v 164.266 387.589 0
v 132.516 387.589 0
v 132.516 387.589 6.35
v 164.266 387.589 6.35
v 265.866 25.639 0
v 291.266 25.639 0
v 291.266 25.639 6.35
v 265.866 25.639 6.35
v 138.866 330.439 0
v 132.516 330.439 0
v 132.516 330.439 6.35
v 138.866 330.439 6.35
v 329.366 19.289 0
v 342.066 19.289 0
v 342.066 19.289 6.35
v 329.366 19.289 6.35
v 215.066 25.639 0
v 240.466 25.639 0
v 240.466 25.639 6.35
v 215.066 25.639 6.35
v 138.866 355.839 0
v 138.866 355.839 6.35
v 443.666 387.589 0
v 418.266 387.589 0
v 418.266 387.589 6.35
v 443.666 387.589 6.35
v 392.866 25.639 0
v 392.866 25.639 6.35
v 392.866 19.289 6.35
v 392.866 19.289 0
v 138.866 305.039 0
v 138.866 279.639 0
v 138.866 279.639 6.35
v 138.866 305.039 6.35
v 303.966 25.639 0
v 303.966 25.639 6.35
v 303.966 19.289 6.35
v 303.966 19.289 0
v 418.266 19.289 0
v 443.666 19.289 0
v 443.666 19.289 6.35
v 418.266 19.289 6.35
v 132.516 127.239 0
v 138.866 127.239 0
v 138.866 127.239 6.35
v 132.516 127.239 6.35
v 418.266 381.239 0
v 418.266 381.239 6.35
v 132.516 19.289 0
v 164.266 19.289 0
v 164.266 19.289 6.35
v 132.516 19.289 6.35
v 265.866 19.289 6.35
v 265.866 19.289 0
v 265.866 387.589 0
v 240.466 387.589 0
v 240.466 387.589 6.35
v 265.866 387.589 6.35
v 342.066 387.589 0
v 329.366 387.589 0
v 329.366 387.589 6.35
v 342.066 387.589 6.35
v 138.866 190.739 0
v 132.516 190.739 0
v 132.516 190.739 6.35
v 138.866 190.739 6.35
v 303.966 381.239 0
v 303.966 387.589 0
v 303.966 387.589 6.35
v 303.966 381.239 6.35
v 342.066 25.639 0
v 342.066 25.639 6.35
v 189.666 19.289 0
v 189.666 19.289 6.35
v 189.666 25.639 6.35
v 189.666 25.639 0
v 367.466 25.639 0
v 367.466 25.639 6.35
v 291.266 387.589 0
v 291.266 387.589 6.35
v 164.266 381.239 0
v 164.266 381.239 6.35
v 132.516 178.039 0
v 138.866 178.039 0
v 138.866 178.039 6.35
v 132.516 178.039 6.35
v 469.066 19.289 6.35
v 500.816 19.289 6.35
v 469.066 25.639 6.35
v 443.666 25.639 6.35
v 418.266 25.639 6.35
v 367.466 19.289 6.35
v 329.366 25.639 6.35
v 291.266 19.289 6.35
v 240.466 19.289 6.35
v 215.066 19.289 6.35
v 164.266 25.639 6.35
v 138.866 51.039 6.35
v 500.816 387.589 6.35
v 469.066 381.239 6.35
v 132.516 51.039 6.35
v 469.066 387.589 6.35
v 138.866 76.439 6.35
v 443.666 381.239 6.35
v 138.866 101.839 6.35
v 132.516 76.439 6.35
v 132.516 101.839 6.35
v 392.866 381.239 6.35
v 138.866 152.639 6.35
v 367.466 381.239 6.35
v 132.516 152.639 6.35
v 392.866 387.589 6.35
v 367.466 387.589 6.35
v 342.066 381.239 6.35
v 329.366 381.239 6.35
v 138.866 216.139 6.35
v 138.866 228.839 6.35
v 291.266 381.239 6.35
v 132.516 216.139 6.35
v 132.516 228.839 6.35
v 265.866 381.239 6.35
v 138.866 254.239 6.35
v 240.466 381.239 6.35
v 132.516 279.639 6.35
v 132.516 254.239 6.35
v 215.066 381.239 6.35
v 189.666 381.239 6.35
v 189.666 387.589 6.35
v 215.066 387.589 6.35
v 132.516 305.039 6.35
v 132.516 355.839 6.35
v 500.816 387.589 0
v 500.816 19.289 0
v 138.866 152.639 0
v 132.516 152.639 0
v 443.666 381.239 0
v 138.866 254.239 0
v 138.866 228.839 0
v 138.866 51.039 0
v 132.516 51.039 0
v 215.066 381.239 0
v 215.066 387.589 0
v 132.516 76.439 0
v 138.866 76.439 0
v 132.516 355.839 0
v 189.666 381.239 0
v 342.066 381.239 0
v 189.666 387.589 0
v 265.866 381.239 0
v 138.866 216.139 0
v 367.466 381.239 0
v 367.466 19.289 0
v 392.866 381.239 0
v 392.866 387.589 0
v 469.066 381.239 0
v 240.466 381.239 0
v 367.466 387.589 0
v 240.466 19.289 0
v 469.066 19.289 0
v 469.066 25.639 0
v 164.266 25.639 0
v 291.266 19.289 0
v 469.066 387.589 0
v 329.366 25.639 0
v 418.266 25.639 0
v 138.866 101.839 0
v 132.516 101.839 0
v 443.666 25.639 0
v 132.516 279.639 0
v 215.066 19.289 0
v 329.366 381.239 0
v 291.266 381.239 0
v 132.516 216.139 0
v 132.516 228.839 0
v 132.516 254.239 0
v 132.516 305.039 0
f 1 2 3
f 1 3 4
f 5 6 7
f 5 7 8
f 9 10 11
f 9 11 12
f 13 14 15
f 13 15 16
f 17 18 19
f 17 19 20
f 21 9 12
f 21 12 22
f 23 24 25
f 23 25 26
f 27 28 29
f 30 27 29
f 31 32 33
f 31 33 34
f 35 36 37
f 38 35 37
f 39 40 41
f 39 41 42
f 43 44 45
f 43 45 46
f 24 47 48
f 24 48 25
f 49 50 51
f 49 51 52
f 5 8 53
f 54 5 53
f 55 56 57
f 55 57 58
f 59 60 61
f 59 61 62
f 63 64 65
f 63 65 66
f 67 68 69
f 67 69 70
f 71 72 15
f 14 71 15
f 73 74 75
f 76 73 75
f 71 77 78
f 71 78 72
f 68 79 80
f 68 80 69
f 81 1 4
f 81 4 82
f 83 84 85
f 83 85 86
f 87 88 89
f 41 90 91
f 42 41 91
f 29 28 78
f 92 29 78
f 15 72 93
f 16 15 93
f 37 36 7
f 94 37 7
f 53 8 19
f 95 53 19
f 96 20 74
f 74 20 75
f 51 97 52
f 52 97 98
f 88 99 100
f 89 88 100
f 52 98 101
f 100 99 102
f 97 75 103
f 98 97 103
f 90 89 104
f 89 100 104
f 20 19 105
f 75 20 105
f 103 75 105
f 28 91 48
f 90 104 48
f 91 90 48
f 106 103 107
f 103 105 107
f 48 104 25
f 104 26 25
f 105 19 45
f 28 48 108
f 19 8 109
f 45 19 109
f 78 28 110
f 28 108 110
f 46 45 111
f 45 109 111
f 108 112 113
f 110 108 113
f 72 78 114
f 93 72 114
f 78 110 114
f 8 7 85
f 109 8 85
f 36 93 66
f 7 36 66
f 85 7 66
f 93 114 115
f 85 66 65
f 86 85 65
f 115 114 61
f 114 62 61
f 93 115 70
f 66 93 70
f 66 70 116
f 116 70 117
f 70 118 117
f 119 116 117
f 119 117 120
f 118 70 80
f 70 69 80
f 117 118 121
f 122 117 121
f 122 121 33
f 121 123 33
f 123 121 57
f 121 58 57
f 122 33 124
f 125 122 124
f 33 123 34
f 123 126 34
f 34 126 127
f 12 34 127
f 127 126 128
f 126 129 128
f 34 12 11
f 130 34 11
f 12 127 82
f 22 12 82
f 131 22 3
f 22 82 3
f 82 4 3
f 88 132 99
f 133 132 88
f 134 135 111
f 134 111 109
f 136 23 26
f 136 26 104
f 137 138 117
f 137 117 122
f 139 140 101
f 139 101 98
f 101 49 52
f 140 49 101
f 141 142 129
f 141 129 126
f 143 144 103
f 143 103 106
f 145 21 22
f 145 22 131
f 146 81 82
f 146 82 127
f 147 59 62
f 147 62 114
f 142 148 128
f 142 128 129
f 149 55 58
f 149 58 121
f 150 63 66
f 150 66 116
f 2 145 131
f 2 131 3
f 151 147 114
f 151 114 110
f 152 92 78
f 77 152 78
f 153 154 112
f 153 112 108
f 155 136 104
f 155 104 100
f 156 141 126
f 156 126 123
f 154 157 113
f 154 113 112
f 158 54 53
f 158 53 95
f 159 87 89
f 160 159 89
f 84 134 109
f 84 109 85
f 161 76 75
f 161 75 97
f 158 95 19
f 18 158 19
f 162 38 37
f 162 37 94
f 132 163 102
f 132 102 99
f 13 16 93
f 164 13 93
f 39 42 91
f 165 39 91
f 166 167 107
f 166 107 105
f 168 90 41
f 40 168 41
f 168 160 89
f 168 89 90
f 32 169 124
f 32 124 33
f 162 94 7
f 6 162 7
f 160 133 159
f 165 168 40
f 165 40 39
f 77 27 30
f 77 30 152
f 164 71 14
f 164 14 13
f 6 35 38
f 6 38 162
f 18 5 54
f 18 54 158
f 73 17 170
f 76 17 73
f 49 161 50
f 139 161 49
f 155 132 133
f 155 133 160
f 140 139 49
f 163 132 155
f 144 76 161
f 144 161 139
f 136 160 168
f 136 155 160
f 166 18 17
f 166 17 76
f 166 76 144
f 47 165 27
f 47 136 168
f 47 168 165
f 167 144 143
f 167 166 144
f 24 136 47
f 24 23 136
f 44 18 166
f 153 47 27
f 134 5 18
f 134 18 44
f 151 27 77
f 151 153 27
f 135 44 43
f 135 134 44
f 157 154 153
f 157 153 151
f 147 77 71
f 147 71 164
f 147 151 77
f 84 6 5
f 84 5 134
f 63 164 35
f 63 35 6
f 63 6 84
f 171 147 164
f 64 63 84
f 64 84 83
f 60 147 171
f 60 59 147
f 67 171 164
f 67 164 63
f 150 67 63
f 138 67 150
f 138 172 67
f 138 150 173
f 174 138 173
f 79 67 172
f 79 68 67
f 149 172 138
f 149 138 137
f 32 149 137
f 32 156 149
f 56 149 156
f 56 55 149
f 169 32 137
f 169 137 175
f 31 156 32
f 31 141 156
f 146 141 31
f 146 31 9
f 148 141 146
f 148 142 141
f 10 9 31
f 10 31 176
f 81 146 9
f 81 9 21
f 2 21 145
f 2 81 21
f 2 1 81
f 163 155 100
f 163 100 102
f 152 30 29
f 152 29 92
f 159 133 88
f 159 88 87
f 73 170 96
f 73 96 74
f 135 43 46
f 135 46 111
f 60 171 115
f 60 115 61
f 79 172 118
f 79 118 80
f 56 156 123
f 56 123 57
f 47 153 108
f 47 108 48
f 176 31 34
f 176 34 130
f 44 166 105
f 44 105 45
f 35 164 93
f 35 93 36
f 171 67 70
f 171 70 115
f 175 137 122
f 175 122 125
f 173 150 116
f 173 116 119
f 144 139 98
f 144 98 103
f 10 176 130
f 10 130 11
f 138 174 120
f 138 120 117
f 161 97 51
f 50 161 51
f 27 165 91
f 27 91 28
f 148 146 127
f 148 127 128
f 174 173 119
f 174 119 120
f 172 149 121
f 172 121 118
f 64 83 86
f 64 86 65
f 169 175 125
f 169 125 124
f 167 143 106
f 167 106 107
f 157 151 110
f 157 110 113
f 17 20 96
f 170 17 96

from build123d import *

# Parameters (mm, degrees)
EXTRUDE1_DEPTH = 6.35


with BuildPart() as part:
    # Sketch1 → Extrude1 (new body)
    with BuildSketch(Plane.XY):
        Polygon((500.815587146, 387.589172699), (500.815587146, 19.289172699), (469.065587146, 19.289172699), (469.065587146, 25.639172699), (443.665587146, 25.639172699), (443.665587146, 19.289172699), (418.265587146, 19.289172699), (418.265587146, 25.639172699), (392.865587146, 25.639172699), (392.865587146, 19.289172699), (367.465587146, 19.289172699), (367.465587146, 25.639172699), (342.065587146, 25.639172699), (342.065587146, 19.289172699), (329.365587146, 19.289172699), (329.365587146, 25.639172699), (303.965587146, 25.639172699), (303.965587146, 19.289172699), (291.265587146, 19.289172699), (291.265587146, 25.639172699), (265.865587146, 25.639172699), (265.865587146, 19.289172699), (240.465587146, 19.289172699), (240.465587146, 25.639172699), (215.065587146, 25.639172699), (215.065587146, 19.289172699), (189.665587146, 19.289172699), (189.665587146, 25.639172699), (164.265587146, 25.639172699), (164.265587146, 19.289172699), (132.515587146, 19.289172699), (132.515587146, 51.039172699), (138.865587146, 51.039172699), (138.865587146, 76.439172699), (132.515587146, 76.439172699), (132.515587146, 101.839172699), (138.865587146, 101.839172699), (138.865587146, 127.239172699), (132.515587146, 127.239172699), (132.515587146, 152.639172699), (138.865587146, 152.639172699), (138.865587146, 178.039172699), (132.515587146, 178.039172699), (132.515587146, 190.739172699), (138.865587146, 190.739172699), (138.865587146, 216.139172699), (132.515587146, 216.139172699), (132.515587146, 228.839172699), (138.865587146, 228.839172699), (138.865587146, 254.239172699), (132.515587146, 254.239172699), (132.515587146, 279.639172699), (138.865587146, 279.639172699), (138.865587146, 305.039172699), (132.515587146, 305.039172699), (132.515587146, 330.439172699), (138.865587146, 330.439172699), (138.865587146, 355.839172699), (132.515587146, 355.839172699), (132.515587146, 387.589172699), (164.265587146, 387.589172699), (164.265587146, 381.239172699), (189.665587146, 381.239172699), (189.665587146, 387.589172699), (215.065587146, 387.589172699), (215.065587146, 381.239172699), (240.465587146, 381.239172699), (240.465587146, 387.589172699), (265.865587146, 387.589172699), (265.865587146, 381.239172699), (291.265587146, 381.239172699), (291.265587146, 387.589172699), (303.965587146, 387.589172699), (303.965587146, 381.239172699), (329.365587146, 381.239172699), (329.365587146, 387.589172699), (342.065587146, 387.589172699), (342.065587146, 381.239172699), (367.465587146, 381.239172699), (367.465587146, 387.589172699), (392.865587146, 387.589172699), (392.865587146, 381.239172699), (418.265587146, 381.239172699), (418.265587146, 387.589172699), (443.665587146, 387.589172699), (443.665587146, 381.239172699), (469.065587146, 381.239172699), (469.065587146, 387.589172699), align=None)
    extrude(amount=EXTRUDE1_DEPTH)


solid = part.part
